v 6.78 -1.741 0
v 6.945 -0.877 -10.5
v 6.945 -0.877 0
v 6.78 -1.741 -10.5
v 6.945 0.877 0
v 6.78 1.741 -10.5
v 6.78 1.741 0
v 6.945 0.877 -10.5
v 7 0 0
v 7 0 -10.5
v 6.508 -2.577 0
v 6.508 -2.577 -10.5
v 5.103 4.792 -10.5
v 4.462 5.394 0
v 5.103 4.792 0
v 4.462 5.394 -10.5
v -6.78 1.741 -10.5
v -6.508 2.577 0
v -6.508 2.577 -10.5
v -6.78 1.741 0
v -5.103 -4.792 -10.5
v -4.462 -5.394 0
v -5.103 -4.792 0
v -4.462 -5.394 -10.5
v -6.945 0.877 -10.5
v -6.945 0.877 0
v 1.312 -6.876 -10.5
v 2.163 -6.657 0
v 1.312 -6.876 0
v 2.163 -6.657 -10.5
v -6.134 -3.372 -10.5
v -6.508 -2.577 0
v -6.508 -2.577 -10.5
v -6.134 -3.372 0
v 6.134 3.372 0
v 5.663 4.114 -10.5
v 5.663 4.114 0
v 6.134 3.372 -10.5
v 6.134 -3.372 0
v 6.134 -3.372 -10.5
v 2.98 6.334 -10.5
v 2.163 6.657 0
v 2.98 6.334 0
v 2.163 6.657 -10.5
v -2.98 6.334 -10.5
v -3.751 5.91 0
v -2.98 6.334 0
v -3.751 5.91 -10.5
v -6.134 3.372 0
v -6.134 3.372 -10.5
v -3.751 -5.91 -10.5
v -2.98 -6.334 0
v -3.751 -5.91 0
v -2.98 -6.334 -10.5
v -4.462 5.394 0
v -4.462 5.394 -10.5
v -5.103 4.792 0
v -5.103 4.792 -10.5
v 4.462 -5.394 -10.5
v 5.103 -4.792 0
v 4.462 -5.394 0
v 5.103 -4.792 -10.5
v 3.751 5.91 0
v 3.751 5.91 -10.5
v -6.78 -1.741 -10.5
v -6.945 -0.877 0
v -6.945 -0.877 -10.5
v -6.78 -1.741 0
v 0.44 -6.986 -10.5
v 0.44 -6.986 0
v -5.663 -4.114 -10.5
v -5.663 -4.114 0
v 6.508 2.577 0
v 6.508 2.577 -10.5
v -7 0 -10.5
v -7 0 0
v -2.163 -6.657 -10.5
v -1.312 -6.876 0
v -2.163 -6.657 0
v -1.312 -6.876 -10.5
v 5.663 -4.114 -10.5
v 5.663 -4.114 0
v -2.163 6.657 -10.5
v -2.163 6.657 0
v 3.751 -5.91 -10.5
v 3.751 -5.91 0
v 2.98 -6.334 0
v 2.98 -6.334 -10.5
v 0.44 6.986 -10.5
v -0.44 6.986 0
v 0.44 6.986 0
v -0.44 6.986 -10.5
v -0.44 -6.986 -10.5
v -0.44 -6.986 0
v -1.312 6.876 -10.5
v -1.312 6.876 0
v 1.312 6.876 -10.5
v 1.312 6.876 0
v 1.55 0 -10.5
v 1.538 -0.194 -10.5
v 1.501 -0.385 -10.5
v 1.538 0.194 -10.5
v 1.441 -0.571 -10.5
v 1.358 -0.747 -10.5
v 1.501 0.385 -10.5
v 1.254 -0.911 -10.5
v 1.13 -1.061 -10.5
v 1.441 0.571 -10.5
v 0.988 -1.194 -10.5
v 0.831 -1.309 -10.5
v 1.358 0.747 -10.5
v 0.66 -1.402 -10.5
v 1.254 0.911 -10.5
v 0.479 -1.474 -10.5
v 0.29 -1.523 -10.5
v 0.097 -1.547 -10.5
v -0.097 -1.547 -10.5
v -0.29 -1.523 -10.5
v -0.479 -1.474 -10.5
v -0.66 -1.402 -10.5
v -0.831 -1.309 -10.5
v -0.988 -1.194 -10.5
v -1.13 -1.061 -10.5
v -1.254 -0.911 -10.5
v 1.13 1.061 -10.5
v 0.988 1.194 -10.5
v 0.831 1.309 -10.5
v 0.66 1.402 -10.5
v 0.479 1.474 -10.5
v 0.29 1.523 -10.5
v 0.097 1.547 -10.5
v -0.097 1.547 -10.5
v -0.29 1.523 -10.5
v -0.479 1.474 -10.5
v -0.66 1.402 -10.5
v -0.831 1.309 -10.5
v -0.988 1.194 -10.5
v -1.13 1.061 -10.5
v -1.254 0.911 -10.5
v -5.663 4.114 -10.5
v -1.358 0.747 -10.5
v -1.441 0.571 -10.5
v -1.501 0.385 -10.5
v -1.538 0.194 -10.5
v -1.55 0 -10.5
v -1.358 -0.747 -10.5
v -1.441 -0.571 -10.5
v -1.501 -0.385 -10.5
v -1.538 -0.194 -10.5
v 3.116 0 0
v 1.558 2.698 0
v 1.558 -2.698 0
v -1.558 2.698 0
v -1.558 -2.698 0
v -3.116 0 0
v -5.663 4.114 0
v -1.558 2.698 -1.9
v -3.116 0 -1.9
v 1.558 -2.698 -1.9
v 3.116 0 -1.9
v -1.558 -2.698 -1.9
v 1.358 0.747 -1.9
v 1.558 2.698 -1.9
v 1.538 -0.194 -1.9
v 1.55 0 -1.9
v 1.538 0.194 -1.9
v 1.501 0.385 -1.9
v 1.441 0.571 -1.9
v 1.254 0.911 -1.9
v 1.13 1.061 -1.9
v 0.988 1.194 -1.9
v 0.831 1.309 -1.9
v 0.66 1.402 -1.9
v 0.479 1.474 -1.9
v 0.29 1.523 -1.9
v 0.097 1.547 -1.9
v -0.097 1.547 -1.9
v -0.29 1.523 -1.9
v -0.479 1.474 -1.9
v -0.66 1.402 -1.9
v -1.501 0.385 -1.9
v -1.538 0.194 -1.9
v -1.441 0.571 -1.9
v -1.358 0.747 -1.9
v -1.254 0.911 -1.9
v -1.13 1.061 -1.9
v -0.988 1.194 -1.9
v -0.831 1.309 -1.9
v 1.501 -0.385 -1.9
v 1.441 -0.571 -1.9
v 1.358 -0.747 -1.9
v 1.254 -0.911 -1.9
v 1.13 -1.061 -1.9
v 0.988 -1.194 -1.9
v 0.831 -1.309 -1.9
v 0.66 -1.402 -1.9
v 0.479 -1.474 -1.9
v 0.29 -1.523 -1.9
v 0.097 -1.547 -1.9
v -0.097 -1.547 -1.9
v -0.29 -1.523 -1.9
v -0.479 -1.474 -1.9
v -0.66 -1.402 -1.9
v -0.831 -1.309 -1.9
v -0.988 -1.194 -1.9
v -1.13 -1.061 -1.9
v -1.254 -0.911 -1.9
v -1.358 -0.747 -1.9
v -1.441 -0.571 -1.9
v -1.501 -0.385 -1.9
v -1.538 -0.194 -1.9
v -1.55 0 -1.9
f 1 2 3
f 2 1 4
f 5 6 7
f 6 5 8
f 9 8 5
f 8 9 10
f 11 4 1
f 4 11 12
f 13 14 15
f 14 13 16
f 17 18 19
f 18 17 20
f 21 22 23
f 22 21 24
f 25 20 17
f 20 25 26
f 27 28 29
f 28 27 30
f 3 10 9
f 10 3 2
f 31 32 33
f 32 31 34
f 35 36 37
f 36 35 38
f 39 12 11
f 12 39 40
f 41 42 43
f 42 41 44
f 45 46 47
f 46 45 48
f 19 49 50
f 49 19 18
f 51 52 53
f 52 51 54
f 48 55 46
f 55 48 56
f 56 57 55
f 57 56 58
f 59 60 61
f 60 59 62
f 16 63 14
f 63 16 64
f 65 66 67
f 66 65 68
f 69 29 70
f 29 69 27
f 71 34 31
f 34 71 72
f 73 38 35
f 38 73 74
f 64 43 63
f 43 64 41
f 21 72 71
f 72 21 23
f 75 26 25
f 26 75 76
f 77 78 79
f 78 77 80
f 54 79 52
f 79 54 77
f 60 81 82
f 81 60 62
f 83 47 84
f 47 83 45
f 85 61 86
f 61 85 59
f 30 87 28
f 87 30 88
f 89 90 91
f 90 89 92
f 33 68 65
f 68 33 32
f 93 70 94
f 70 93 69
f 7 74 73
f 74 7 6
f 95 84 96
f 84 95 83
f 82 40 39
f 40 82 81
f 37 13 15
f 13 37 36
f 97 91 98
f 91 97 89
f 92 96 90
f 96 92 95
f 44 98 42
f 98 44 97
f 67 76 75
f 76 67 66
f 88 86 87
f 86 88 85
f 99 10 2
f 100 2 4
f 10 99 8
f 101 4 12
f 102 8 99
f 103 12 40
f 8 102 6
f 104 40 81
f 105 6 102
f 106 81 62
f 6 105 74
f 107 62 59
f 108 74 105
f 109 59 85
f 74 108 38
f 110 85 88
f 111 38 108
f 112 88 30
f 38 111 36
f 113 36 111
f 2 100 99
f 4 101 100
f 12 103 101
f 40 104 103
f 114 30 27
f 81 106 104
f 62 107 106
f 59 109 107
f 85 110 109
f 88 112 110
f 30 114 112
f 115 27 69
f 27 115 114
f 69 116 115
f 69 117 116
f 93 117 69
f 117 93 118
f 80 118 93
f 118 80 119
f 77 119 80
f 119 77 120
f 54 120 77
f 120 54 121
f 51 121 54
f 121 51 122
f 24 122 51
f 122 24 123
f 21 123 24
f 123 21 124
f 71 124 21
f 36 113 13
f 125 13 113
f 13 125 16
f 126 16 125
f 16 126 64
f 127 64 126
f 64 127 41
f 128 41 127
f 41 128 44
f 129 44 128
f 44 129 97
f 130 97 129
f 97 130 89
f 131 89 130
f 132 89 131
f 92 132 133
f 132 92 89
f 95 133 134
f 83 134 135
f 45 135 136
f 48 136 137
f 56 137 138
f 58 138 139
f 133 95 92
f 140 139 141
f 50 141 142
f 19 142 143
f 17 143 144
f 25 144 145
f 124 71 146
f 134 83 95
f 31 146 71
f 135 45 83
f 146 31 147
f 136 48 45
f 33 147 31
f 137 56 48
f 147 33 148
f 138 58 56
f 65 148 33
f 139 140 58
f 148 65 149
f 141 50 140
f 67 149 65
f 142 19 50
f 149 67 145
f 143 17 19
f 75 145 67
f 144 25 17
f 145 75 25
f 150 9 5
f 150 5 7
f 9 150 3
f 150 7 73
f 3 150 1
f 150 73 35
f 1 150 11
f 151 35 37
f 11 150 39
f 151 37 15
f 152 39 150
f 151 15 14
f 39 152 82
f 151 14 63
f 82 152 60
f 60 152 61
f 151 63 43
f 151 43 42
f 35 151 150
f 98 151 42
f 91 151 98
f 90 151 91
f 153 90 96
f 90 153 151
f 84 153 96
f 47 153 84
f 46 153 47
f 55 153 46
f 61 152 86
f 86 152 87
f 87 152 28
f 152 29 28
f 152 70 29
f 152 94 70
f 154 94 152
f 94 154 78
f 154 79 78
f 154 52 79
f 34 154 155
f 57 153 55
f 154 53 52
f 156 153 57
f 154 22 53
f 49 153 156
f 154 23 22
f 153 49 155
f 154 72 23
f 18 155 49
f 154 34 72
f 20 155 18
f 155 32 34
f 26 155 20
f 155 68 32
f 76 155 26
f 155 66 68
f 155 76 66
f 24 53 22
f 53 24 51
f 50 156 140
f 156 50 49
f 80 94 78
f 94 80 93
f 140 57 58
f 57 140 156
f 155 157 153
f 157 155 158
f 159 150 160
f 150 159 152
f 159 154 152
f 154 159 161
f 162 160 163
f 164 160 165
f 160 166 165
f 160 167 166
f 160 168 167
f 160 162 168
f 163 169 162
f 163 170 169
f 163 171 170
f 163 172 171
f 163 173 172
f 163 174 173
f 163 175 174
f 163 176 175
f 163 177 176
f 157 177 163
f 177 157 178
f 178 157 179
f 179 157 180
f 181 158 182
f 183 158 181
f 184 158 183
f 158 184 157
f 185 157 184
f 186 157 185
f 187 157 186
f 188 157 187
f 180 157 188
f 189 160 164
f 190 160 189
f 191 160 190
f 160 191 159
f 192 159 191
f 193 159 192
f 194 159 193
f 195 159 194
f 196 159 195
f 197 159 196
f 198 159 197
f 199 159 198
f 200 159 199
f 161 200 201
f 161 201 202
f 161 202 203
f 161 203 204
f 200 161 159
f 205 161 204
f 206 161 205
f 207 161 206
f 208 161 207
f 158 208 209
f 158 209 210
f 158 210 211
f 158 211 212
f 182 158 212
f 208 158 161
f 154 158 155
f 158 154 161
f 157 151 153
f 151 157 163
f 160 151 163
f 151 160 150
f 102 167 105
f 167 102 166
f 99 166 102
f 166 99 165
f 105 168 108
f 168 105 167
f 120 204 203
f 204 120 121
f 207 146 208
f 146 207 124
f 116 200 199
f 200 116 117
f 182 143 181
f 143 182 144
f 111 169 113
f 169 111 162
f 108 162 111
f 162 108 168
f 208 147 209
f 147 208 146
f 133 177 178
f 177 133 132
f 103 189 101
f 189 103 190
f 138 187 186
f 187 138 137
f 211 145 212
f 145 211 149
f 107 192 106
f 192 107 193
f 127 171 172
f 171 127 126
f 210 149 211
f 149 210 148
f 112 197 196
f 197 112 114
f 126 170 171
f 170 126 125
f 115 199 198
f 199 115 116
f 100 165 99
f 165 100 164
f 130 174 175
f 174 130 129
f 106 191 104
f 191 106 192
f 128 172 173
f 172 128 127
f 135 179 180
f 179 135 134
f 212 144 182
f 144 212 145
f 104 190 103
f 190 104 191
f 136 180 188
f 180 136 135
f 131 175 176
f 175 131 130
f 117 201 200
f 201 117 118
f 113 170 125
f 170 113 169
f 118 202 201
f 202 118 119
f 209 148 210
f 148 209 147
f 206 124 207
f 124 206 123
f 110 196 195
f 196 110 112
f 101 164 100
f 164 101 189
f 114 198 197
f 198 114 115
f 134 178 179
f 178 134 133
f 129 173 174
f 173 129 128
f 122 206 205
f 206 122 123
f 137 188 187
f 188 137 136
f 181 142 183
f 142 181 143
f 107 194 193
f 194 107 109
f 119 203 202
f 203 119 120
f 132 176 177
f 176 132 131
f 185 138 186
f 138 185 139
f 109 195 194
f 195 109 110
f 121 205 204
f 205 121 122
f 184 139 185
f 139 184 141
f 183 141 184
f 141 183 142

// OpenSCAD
$fn = 50;


difference() {
	union() {
		translate(v = [0, 0, -10.5000000000]) {
			cylinder(h = 10.5000000000, r = 7.0000000000);
		}
		translate(v = [0, 0, -9.0000000000]) {
			cylinder(h = 9, r = 2.8750000000);
		}
	}
	union() {
		translate(v = [0, 0, 0]) {
			rotate(a = [0, 0, 0]) {
				difference() {
					union() {
						translate(v = [0, 0, -1.9000000000]) {
							linear_extrude(height = 1.9000000000) {
								polygon(points = [[3.1158000000, 0.0000000000], [1.5579000000, 2.6983619531], [-1.5579000000, 2.6983619531], [-3.1158000000, 0.0000000000], [-1.5579000000, -2.6983619531], [1.5579000000, -2.6983619531]]);
							}
						}
					}
					union();
				}
			}
		}
		#translate(v = [0, 0, -100.0000000000]) {
			cylinder(h = 200, r = 1.5500000000);
		}
	}
}
